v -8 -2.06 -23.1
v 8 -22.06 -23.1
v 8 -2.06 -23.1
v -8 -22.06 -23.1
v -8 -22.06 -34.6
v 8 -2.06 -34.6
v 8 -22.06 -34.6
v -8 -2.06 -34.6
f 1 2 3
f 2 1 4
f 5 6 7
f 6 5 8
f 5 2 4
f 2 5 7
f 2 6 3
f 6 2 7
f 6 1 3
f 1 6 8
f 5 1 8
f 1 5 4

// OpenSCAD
// file: lib/v6.scad
// Simplified E3D V6, placed according to the Igneus body's hotend seat.
// The nozzle tip ends up ~2 mm below the ducts (adjustable with the height slot).
$fn = 48;
v6_axis = [0, -14.06];
v6_top = 21.7;                       // top of the groove mount
v6_hs_bottom = v6_top - 42.7;        // bottom of the heatsink
v6_block_top = v6_hs_bottom - 2.1;   // top of the heater block

module v6_heatsink() translate([v6_axis[0], v6_axis[1], 0]) {
    translate([0, 0, v6_top - 3.7]) cylinder(d = 16, h = 3.7);
    translate([0, 0, v6_top - 9.7]) cylinder(d = 12, h = 6 + 0.01);
    translate([0, 0, v6_top - 12.7]) cylinder(d = 16, h = 3 + 0.01);
    translate([0, 0, v6_hs_bottom]) cylinder(d = 10, h = 30 + 0.01);
    for (i = [0 : 10]) translate([0, 0, v6_top - 12.7 - 2.2 - i * 2.55]) cylinder(d = 22.3, h = 1.1);
    translate([0, 0, v6_hs_bottom]) cylinder(d = 16, h = 1.2);
    translate([0, 0, v6_block_top - 0.01]) cylinder(d = 7, h = 2.2);   // heatbreak
}
module v6_heater_block() translate([v6_axis[0], v6_axis[1], 0])
    translate([-8, -8, v6_block_top - 11.5]) cube([16, 20, 11.5]);
module v6_heater_cartridge() translate([v6_axis[0], v6_axis[1], 0]) {
    translate([-10, 7, v6_block_top - 5.75]) rotate([0, 90, 0]) cylinder(d = 6, h = 20);
    translate([8, -4.5, v6_block_top - 8]) rotate([0, 90, 0]) cylinder(d = 3, h = 2);   // thermistor
}
module v6_nozzle() translate([v6_axis[0], v6_axis[1], 0]) {
    translate([0, 0, v6_block_top - 11.5 - 3]) cylinder(d = 8.08, h = 3 + 0.01, $fn = 6);
    translate([0, 0, v6_block_top - 11.5 - 5]) cylinder(d1 = 1, d2 = 5, h = 2 + 0.01);
}
// main file
// color: #b9bec5
// material: metal
// PREVIEW ONLY: E3D V6 heater block (aluminium).
include <lib/v6.scad>
v6_heater_block();
